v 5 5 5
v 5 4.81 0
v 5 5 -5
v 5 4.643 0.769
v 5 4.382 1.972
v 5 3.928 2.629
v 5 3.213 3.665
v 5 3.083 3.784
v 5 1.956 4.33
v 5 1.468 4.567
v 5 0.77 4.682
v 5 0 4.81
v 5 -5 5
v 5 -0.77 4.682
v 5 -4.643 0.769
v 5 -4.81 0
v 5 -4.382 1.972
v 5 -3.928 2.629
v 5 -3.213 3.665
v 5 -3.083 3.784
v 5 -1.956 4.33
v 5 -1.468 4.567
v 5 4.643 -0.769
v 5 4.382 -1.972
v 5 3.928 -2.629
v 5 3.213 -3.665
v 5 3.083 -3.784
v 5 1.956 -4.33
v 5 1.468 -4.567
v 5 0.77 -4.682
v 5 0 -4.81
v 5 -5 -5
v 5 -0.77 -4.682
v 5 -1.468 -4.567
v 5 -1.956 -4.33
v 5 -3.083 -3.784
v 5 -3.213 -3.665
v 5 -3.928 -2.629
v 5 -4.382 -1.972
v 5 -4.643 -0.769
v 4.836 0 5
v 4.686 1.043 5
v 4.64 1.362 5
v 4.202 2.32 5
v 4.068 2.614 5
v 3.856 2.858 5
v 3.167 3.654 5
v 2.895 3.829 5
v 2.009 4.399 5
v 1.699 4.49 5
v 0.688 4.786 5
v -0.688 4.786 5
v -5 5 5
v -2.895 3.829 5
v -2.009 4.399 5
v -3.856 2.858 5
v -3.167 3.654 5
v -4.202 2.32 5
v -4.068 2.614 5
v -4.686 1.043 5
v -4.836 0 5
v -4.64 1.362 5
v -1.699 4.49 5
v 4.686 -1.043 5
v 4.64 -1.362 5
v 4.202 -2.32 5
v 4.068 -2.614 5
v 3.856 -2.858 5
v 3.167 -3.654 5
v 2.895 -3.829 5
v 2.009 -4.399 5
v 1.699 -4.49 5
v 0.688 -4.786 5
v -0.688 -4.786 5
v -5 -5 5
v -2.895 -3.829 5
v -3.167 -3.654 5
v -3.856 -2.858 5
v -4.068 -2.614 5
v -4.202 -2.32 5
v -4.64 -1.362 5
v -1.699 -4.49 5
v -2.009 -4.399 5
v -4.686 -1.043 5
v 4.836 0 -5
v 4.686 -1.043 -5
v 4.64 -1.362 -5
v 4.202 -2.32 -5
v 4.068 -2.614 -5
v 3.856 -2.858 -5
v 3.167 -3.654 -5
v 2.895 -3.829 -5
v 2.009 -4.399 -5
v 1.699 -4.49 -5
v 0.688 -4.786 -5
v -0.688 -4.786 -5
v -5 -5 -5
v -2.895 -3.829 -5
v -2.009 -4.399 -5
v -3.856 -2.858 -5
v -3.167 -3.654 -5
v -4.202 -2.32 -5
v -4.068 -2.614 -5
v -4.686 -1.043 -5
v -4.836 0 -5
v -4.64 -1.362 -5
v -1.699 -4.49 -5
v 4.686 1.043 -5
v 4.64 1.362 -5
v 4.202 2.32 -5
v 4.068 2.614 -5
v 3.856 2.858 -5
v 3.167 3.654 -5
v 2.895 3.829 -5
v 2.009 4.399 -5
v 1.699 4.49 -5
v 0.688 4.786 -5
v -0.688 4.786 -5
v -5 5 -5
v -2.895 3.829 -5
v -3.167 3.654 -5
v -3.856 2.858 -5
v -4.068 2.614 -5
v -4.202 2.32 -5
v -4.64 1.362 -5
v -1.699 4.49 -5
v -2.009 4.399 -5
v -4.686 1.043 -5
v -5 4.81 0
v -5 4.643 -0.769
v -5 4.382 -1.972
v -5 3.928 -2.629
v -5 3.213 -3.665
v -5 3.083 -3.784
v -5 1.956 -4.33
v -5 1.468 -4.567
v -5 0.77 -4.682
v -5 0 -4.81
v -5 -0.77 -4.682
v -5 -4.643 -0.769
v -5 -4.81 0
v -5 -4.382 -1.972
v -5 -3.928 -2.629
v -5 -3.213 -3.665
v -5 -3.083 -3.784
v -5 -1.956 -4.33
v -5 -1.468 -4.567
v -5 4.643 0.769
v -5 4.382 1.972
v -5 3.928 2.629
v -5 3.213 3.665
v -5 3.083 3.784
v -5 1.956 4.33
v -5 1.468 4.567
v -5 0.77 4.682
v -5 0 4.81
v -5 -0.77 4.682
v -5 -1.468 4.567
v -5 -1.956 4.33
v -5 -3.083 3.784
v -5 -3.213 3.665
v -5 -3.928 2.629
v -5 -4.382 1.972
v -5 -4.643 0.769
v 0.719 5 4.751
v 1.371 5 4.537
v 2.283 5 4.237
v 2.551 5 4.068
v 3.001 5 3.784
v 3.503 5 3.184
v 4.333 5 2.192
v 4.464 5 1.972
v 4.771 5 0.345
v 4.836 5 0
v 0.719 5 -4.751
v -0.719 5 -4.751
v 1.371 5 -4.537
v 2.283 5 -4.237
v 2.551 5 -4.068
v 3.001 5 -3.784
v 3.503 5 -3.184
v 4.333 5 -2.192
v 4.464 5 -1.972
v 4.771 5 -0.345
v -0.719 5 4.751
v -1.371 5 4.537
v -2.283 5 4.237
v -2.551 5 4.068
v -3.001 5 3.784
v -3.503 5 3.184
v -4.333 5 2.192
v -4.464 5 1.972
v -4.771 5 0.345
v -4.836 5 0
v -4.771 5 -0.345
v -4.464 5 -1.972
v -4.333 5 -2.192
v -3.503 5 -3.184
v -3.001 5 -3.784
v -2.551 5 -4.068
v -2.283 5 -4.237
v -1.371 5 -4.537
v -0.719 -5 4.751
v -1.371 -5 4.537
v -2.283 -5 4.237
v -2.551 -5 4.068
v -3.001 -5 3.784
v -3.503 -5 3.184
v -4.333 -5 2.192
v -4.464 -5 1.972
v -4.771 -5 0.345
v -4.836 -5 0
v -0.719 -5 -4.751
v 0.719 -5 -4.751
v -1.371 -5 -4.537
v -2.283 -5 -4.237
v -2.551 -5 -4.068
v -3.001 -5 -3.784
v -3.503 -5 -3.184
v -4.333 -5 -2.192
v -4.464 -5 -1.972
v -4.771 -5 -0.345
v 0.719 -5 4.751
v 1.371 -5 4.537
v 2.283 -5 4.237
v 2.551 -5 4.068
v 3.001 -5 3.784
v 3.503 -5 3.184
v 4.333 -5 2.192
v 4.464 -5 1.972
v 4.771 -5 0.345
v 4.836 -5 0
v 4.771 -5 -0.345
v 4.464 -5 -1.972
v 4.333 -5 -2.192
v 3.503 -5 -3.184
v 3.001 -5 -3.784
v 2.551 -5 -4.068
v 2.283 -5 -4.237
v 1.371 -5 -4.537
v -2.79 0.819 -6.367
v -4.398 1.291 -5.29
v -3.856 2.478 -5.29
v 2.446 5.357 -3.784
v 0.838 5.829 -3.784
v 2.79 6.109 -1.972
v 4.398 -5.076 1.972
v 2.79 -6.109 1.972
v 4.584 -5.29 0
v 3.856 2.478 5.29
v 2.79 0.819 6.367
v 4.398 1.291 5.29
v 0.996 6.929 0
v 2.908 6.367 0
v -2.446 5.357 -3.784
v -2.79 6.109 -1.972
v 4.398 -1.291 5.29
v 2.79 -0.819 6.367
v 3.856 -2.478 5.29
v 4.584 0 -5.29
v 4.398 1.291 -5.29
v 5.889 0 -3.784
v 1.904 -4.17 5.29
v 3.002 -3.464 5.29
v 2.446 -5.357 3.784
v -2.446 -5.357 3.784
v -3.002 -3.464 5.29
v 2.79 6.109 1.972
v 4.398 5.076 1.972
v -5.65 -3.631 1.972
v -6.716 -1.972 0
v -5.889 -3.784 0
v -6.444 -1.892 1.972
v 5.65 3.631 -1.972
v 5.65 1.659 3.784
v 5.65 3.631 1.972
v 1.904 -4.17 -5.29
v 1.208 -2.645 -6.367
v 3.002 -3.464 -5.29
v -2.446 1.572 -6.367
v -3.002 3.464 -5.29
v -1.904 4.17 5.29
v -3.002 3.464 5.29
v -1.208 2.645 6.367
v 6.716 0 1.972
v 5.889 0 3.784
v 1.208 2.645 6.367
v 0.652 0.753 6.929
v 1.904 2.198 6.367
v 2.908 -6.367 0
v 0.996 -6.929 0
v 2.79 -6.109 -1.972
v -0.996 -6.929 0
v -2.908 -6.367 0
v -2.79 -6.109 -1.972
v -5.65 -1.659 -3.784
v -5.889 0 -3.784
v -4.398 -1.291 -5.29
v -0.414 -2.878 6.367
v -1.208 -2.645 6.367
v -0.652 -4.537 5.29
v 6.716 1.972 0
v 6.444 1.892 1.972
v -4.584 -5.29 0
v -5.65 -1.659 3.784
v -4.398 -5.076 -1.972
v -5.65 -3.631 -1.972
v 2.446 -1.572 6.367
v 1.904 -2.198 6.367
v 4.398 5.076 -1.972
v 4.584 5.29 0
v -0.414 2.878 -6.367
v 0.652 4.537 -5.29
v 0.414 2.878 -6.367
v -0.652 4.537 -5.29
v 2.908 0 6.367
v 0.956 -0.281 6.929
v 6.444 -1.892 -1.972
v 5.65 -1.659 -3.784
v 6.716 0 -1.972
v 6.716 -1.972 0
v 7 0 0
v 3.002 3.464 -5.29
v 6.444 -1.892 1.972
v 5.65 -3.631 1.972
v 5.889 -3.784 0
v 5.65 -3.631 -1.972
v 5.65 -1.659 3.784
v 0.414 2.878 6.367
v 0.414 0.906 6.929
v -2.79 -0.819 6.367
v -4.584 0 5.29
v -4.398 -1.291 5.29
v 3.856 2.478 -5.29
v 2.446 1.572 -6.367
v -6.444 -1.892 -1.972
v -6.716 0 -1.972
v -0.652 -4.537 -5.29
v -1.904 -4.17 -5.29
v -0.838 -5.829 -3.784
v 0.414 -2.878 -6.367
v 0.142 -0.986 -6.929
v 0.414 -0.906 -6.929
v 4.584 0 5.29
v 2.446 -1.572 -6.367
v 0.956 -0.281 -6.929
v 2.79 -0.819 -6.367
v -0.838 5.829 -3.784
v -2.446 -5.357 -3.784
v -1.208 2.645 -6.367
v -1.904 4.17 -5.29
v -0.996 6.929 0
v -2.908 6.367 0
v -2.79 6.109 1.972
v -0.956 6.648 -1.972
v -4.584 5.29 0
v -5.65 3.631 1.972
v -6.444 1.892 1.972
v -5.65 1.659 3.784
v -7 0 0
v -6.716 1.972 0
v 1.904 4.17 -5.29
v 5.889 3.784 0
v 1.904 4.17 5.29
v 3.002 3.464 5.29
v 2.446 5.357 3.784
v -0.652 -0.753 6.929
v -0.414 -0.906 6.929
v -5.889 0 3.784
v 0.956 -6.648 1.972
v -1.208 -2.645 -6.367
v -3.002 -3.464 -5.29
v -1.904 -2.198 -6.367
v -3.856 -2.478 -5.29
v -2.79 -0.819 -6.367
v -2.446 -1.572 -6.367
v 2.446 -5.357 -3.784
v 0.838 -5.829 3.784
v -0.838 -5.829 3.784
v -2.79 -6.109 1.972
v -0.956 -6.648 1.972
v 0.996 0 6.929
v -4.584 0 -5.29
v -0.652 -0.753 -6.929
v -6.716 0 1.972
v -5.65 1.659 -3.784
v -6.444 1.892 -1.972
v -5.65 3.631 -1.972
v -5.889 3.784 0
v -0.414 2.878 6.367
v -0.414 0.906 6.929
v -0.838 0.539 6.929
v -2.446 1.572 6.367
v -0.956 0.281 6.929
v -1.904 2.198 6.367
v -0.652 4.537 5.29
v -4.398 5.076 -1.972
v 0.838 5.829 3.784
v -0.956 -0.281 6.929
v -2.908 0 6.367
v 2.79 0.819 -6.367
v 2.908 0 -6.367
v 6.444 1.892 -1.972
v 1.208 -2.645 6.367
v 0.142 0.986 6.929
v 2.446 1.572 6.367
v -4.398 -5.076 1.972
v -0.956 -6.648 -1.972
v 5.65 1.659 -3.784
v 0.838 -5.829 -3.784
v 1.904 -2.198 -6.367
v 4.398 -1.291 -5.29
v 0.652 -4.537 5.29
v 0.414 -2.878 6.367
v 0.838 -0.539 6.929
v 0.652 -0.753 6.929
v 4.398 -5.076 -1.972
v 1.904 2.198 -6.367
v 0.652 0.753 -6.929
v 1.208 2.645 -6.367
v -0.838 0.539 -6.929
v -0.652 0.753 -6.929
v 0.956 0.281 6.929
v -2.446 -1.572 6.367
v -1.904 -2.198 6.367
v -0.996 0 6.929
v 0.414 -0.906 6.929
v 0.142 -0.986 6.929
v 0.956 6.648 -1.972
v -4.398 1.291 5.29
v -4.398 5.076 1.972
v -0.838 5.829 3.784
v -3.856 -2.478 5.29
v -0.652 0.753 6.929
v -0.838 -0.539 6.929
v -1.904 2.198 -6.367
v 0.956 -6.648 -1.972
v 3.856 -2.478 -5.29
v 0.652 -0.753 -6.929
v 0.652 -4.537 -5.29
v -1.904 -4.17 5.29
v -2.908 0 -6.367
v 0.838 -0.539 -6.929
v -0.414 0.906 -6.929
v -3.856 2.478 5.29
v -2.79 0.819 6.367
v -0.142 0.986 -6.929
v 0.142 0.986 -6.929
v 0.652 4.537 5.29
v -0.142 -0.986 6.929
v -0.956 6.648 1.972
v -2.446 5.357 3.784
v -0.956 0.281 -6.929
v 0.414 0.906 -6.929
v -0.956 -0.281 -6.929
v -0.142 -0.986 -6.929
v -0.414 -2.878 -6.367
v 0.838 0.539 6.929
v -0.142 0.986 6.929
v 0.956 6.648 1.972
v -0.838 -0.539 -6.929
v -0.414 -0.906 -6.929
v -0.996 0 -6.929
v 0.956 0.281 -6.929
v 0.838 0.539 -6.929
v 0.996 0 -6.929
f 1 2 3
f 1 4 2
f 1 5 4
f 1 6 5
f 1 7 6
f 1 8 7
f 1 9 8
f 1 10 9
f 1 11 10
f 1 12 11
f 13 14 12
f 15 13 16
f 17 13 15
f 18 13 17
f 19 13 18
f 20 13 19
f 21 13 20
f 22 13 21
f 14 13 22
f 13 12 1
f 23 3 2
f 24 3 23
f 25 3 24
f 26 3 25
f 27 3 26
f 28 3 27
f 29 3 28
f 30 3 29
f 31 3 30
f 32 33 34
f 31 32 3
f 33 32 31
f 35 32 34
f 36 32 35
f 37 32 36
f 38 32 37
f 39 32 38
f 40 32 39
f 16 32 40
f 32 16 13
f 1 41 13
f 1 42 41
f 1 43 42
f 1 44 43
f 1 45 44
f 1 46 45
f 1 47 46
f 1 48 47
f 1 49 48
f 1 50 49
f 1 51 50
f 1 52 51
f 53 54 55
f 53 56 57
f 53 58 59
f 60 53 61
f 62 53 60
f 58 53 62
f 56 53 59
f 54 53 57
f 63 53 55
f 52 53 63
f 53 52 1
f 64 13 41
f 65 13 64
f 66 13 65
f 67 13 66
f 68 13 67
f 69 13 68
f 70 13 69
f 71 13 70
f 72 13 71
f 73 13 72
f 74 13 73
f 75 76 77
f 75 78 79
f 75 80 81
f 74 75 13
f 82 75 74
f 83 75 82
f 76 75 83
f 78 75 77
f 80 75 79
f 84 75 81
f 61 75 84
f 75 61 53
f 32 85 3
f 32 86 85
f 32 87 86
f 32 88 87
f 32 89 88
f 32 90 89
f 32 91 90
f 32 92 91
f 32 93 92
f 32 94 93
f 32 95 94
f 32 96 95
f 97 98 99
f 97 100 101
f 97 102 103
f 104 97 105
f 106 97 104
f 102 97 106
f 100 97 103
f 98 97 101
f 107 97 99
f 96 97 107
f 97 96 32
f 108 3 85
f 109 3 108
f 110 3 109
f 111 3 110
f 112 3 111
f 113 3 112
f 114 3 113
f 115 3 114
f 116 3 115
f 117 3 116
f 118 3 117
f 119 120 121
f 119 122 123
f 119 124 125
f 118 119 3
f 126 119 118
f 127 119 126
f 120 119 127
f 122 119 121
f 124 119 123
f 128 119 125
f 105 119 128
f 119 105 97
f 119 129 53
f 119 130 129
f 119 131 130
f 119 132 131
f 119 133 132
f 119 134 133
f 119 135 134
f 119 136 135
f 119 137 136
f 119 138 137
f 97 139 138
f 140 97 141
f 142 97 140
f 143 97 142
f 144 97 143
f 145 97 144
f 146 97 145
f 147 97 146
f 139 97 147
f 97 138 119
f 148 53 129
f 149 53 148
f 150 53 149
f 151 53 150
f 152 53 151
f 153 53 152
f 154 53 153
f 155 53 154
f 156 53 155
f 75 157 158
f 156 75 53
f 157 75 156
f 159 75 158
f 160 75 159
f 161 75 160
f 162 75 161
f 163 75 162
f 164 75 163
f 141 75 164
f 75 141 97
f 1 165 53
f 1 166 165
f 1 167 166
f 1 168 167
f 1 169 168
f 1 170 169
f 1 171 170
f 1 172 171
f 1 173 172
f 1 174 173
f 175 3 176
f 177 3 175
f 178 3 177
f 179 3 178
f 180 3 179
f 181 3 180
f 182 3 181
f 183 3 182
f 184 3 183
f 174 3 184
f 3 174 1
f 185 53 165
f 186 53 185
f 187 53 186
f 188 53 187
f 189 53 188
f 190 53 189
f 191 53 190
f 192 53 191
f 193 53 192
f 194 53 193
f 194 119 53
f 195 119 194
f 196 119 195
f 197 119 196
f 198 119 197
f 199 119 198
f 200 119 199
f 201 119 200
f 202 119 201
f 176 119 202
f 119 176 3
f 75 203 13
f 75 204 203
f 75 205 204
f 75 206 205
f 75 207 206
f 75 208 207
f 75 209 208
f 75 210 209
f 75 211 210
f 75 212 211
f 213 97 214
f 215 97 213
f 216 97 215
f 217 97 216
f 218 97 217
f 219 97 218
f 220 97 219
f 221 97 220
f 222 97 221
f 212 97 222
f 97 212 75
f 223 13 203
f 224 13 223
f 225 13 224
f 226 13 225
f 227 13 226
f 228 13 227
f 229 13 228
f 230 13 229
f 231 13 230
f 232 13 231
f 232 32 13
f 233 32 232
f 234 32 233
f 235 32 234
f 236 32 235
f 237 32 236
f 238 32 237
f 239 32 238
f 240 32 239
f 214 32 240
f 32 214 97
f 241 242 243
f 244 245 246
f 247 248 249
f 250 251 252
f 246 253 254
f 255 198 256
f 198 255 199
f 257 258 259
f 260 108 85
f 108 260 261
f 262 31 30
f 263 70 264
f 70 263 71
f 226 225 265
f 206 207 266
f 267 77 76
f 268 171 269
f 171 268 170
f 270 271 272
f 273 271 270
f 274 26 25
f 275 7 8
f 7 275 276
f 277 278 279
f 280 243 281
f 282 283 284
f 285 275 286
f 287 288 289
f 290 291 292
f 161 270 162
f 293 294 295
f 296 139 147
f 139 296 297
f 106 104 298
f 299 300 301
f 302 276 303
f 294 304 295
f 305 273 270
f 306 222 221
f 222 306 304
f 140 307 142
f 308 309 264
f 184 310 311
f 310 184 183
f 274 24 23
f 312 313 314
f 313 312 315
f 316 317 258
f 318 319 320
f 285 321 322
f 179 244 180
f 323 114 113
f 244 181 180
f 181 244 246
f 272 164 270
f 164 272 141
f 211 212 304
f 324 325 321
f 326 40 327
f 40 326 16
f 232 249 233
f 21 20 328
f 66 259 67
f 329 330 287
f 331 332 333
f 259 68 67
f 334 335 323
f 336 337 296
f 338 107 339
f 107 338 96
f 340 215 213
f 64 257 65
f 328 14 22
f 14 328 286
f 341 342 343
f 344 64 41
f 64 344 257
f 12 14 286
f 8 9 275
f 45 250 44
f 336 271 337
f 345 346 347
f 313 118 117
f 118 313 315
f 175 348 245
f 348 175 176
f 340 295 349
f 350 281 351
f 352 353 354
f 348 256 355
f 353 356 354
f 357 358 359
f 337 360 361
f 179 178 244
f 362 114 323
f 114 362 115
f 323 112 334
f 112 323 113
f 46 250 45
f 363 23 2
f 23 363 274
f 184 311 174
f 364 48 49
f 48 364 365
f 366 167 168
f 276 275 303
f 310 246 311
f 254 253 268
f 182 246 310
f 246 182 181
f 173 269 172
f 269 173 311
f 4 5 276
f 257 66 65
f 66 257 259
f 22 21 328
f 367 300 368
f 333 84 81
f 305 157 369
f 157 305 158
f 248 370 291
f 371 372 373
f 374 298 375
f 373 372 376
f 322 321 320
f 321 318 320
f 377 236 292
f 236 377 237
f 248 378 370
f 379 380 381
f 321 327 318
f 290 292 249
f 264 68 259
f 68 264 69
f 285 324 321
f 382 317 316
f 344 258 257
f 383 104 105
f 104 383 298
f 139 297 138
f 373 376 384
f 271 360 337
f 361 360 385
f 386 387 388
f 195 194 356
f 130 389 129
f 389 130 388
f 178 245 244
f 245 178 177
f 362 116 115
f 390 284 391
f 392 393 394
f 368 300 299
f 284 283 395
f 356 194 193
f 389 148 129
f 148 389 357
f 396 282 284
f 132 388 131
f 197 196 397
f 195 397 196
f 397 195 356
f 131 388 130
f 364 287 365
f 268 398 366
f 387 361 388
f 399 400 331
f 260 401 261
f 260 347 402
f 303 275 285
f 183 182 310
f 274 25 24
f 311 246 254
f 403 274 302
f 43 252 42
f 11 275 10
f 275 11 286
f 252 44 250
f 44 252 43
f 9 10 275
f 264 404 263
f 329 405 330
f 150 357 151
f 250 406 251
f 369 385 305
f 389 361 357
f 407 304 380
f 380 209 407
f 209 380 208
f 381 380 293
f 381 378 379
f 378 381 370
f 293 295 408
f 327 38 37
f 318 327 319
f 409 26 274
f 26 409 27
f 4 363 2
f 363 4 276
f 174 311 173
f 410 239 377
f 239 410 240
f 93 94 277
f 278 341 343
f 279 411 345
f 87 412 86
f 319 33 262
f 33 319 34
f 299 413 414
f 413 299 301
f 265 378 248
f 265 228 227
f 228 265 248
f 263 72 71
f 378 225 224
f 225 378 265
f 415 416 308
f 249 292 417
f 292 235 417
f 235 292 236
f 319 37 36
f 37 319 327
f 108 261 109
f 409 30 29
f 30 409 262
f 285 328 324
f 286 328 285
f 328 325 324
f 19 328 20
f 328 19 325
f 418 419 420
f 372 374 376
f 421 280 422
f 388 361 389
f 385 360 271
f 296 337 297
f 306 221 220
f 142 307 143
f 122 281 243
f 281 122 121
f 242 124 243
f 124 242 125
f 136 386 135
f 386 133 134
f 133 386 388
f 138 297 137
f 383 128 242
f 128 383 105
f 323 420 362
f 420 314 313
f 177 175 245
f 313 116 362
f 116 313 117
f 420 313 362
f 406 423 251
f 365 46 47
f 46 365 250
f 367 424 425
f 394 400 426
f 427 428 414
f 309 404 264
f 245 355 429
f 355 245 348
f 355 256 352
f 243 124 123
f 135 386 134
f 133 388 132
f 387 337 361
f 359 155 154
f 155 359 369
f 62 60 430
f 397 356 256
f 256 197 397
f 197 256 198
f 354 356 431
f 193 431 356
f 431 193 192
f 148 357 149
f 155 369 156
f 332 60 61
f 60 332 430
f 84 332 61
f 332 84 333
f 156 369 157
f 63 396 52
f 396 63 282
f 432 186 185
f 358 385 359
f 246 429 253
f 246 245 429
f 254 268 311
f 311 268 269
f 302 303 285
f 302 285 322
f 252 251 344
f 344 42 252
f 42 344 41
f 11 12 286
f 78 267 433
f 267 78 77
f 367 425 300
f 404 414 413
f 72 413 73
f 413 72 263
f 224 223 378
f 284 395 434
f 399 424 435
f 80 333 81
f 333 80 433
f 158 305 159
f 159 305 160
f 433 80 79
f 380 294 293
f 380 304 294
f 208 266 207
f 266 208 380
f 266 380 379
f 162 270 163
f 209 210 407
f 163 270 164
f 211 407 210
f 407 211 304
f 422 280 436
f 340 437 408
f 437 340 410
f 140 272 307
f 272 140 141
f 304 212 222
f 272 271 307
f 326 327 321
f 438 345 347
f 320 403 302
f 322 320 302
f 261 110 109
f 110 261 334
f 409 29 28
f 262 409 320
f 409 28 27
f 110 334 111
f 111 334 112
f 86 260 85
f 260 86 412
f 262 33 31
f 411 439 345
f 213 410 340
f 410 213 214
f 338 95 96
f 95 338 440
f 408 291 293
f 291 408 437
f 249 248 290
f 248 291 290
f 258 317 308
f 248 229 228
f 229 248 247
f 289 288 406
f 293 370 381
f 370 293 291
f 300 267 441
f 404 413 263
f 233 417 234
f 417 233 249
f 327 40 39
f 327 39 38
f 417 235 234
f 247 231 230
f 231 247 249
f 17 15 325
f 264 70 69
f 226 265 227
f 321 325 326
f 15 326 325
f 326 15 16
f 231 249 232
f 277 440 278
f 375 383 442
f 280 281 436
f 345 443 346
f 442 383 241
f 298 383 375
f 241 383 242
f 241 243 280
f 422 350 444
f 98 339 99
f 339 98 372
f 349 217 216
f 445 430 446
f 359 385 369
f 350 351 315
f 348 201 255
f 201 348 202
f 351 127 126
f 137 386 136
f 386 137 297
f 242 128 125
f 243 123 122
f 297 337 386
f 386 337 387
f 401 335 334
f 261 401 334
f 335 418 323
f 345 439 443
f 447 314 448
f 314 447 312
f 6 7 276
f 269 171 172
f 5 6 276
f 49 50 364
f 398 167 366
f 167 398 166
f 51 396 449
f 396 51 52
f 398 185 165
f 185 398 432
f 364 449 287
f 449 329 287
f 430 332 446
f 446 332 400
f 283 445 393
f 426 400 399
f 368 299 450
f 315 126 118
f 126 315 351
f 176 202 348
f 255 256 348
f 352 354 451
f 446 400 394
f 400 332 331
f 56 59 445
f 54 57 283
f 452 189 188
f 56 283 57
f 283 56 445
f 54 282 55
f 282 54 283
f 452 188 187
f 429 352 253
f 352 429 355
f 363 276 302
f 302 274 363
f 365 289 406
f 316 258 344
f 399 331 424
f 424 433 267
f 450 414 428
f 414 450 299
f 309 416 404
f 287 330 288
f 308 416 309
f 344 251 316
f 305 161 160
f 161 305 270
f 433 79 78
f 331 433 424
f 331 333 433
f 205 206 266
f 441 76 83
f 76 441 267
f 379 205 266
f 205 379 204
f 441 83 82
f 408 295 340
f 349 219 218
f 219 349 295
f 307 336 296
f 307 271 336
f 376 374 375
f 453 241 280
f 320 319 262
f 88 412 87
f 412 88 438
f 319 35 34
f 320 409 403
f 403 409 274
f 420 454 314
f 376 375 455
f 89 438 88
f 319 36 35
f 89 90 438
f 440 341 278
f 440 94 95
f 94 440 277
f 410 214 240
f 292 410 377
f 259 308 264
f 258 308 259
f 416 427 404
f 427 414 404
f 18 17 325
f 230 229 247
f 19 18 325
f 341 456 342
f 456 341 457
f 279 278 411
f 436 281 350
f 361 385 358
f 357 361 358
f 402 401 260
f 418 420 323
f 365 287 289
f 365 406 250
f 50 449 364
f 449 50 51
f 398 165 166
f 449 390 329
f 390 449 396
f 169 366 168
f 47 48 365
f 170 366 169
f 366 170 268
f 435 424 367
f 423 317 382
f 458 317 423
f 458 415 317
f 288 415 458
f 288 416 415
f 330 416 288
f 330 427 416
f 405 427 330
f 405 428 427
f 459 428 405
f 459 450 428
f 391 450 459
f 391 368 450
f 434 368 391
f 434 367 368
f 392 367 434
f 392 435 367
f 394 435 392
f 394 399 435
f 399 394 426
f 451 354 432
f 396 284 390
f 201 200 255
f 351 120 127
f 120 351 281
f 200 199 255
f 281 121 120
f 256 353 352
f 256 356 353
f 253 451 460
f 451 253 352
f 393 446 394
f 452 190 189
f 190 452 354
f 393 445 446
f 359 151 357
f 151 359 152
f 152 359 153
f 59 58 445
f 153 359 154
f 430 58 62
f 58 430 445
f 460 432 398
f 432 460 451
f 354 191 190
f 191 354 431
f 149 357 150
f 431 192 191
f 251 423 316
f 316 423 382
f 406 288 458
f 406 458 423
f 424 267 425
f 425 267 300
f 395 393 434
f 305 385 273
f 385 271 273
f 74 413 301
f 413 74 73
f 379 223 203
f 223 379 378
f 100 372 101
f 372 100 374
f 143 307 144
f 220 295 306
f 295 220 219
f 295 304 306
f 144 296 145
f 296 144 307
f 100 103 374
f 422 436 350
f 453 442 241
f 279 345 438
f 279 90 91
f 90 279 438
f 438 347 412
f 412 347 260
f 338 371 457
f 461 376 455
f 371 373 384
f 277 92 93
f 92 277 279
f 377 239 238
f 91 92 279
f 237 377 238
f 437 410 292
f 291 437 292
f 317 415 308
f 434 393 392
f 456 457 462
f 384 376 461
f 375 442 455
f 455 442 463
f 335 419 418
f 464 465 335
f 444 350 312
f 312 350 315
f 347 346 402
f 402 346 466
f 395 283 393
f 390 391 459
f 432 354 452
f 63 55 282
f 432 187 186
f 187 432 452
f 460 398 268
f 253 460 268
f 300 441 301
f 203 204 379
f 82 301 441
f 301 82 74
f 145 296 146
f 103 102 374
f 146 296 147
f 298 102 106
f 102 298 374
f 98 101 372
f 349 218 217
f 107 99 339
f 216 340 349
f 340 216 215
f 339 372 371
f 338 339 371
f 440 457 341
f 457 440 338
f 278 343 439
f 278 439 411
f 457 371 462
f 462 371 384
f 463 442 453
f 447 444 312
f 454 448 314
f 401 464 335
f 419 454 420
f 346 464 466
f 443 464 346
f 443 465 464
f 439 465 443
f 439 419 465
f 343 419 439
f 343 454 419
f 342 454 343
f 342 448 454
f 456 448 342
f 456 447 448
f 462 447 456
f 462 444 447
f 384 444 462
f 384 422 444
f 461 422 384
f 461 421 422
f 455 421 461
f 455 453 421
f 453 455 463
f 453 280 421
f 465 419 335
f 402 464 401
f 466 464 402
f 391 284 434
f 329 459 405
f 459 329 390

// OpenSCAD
module test(){
  cube(size=10,center=true);
  sphere(r=7);
}
test();
